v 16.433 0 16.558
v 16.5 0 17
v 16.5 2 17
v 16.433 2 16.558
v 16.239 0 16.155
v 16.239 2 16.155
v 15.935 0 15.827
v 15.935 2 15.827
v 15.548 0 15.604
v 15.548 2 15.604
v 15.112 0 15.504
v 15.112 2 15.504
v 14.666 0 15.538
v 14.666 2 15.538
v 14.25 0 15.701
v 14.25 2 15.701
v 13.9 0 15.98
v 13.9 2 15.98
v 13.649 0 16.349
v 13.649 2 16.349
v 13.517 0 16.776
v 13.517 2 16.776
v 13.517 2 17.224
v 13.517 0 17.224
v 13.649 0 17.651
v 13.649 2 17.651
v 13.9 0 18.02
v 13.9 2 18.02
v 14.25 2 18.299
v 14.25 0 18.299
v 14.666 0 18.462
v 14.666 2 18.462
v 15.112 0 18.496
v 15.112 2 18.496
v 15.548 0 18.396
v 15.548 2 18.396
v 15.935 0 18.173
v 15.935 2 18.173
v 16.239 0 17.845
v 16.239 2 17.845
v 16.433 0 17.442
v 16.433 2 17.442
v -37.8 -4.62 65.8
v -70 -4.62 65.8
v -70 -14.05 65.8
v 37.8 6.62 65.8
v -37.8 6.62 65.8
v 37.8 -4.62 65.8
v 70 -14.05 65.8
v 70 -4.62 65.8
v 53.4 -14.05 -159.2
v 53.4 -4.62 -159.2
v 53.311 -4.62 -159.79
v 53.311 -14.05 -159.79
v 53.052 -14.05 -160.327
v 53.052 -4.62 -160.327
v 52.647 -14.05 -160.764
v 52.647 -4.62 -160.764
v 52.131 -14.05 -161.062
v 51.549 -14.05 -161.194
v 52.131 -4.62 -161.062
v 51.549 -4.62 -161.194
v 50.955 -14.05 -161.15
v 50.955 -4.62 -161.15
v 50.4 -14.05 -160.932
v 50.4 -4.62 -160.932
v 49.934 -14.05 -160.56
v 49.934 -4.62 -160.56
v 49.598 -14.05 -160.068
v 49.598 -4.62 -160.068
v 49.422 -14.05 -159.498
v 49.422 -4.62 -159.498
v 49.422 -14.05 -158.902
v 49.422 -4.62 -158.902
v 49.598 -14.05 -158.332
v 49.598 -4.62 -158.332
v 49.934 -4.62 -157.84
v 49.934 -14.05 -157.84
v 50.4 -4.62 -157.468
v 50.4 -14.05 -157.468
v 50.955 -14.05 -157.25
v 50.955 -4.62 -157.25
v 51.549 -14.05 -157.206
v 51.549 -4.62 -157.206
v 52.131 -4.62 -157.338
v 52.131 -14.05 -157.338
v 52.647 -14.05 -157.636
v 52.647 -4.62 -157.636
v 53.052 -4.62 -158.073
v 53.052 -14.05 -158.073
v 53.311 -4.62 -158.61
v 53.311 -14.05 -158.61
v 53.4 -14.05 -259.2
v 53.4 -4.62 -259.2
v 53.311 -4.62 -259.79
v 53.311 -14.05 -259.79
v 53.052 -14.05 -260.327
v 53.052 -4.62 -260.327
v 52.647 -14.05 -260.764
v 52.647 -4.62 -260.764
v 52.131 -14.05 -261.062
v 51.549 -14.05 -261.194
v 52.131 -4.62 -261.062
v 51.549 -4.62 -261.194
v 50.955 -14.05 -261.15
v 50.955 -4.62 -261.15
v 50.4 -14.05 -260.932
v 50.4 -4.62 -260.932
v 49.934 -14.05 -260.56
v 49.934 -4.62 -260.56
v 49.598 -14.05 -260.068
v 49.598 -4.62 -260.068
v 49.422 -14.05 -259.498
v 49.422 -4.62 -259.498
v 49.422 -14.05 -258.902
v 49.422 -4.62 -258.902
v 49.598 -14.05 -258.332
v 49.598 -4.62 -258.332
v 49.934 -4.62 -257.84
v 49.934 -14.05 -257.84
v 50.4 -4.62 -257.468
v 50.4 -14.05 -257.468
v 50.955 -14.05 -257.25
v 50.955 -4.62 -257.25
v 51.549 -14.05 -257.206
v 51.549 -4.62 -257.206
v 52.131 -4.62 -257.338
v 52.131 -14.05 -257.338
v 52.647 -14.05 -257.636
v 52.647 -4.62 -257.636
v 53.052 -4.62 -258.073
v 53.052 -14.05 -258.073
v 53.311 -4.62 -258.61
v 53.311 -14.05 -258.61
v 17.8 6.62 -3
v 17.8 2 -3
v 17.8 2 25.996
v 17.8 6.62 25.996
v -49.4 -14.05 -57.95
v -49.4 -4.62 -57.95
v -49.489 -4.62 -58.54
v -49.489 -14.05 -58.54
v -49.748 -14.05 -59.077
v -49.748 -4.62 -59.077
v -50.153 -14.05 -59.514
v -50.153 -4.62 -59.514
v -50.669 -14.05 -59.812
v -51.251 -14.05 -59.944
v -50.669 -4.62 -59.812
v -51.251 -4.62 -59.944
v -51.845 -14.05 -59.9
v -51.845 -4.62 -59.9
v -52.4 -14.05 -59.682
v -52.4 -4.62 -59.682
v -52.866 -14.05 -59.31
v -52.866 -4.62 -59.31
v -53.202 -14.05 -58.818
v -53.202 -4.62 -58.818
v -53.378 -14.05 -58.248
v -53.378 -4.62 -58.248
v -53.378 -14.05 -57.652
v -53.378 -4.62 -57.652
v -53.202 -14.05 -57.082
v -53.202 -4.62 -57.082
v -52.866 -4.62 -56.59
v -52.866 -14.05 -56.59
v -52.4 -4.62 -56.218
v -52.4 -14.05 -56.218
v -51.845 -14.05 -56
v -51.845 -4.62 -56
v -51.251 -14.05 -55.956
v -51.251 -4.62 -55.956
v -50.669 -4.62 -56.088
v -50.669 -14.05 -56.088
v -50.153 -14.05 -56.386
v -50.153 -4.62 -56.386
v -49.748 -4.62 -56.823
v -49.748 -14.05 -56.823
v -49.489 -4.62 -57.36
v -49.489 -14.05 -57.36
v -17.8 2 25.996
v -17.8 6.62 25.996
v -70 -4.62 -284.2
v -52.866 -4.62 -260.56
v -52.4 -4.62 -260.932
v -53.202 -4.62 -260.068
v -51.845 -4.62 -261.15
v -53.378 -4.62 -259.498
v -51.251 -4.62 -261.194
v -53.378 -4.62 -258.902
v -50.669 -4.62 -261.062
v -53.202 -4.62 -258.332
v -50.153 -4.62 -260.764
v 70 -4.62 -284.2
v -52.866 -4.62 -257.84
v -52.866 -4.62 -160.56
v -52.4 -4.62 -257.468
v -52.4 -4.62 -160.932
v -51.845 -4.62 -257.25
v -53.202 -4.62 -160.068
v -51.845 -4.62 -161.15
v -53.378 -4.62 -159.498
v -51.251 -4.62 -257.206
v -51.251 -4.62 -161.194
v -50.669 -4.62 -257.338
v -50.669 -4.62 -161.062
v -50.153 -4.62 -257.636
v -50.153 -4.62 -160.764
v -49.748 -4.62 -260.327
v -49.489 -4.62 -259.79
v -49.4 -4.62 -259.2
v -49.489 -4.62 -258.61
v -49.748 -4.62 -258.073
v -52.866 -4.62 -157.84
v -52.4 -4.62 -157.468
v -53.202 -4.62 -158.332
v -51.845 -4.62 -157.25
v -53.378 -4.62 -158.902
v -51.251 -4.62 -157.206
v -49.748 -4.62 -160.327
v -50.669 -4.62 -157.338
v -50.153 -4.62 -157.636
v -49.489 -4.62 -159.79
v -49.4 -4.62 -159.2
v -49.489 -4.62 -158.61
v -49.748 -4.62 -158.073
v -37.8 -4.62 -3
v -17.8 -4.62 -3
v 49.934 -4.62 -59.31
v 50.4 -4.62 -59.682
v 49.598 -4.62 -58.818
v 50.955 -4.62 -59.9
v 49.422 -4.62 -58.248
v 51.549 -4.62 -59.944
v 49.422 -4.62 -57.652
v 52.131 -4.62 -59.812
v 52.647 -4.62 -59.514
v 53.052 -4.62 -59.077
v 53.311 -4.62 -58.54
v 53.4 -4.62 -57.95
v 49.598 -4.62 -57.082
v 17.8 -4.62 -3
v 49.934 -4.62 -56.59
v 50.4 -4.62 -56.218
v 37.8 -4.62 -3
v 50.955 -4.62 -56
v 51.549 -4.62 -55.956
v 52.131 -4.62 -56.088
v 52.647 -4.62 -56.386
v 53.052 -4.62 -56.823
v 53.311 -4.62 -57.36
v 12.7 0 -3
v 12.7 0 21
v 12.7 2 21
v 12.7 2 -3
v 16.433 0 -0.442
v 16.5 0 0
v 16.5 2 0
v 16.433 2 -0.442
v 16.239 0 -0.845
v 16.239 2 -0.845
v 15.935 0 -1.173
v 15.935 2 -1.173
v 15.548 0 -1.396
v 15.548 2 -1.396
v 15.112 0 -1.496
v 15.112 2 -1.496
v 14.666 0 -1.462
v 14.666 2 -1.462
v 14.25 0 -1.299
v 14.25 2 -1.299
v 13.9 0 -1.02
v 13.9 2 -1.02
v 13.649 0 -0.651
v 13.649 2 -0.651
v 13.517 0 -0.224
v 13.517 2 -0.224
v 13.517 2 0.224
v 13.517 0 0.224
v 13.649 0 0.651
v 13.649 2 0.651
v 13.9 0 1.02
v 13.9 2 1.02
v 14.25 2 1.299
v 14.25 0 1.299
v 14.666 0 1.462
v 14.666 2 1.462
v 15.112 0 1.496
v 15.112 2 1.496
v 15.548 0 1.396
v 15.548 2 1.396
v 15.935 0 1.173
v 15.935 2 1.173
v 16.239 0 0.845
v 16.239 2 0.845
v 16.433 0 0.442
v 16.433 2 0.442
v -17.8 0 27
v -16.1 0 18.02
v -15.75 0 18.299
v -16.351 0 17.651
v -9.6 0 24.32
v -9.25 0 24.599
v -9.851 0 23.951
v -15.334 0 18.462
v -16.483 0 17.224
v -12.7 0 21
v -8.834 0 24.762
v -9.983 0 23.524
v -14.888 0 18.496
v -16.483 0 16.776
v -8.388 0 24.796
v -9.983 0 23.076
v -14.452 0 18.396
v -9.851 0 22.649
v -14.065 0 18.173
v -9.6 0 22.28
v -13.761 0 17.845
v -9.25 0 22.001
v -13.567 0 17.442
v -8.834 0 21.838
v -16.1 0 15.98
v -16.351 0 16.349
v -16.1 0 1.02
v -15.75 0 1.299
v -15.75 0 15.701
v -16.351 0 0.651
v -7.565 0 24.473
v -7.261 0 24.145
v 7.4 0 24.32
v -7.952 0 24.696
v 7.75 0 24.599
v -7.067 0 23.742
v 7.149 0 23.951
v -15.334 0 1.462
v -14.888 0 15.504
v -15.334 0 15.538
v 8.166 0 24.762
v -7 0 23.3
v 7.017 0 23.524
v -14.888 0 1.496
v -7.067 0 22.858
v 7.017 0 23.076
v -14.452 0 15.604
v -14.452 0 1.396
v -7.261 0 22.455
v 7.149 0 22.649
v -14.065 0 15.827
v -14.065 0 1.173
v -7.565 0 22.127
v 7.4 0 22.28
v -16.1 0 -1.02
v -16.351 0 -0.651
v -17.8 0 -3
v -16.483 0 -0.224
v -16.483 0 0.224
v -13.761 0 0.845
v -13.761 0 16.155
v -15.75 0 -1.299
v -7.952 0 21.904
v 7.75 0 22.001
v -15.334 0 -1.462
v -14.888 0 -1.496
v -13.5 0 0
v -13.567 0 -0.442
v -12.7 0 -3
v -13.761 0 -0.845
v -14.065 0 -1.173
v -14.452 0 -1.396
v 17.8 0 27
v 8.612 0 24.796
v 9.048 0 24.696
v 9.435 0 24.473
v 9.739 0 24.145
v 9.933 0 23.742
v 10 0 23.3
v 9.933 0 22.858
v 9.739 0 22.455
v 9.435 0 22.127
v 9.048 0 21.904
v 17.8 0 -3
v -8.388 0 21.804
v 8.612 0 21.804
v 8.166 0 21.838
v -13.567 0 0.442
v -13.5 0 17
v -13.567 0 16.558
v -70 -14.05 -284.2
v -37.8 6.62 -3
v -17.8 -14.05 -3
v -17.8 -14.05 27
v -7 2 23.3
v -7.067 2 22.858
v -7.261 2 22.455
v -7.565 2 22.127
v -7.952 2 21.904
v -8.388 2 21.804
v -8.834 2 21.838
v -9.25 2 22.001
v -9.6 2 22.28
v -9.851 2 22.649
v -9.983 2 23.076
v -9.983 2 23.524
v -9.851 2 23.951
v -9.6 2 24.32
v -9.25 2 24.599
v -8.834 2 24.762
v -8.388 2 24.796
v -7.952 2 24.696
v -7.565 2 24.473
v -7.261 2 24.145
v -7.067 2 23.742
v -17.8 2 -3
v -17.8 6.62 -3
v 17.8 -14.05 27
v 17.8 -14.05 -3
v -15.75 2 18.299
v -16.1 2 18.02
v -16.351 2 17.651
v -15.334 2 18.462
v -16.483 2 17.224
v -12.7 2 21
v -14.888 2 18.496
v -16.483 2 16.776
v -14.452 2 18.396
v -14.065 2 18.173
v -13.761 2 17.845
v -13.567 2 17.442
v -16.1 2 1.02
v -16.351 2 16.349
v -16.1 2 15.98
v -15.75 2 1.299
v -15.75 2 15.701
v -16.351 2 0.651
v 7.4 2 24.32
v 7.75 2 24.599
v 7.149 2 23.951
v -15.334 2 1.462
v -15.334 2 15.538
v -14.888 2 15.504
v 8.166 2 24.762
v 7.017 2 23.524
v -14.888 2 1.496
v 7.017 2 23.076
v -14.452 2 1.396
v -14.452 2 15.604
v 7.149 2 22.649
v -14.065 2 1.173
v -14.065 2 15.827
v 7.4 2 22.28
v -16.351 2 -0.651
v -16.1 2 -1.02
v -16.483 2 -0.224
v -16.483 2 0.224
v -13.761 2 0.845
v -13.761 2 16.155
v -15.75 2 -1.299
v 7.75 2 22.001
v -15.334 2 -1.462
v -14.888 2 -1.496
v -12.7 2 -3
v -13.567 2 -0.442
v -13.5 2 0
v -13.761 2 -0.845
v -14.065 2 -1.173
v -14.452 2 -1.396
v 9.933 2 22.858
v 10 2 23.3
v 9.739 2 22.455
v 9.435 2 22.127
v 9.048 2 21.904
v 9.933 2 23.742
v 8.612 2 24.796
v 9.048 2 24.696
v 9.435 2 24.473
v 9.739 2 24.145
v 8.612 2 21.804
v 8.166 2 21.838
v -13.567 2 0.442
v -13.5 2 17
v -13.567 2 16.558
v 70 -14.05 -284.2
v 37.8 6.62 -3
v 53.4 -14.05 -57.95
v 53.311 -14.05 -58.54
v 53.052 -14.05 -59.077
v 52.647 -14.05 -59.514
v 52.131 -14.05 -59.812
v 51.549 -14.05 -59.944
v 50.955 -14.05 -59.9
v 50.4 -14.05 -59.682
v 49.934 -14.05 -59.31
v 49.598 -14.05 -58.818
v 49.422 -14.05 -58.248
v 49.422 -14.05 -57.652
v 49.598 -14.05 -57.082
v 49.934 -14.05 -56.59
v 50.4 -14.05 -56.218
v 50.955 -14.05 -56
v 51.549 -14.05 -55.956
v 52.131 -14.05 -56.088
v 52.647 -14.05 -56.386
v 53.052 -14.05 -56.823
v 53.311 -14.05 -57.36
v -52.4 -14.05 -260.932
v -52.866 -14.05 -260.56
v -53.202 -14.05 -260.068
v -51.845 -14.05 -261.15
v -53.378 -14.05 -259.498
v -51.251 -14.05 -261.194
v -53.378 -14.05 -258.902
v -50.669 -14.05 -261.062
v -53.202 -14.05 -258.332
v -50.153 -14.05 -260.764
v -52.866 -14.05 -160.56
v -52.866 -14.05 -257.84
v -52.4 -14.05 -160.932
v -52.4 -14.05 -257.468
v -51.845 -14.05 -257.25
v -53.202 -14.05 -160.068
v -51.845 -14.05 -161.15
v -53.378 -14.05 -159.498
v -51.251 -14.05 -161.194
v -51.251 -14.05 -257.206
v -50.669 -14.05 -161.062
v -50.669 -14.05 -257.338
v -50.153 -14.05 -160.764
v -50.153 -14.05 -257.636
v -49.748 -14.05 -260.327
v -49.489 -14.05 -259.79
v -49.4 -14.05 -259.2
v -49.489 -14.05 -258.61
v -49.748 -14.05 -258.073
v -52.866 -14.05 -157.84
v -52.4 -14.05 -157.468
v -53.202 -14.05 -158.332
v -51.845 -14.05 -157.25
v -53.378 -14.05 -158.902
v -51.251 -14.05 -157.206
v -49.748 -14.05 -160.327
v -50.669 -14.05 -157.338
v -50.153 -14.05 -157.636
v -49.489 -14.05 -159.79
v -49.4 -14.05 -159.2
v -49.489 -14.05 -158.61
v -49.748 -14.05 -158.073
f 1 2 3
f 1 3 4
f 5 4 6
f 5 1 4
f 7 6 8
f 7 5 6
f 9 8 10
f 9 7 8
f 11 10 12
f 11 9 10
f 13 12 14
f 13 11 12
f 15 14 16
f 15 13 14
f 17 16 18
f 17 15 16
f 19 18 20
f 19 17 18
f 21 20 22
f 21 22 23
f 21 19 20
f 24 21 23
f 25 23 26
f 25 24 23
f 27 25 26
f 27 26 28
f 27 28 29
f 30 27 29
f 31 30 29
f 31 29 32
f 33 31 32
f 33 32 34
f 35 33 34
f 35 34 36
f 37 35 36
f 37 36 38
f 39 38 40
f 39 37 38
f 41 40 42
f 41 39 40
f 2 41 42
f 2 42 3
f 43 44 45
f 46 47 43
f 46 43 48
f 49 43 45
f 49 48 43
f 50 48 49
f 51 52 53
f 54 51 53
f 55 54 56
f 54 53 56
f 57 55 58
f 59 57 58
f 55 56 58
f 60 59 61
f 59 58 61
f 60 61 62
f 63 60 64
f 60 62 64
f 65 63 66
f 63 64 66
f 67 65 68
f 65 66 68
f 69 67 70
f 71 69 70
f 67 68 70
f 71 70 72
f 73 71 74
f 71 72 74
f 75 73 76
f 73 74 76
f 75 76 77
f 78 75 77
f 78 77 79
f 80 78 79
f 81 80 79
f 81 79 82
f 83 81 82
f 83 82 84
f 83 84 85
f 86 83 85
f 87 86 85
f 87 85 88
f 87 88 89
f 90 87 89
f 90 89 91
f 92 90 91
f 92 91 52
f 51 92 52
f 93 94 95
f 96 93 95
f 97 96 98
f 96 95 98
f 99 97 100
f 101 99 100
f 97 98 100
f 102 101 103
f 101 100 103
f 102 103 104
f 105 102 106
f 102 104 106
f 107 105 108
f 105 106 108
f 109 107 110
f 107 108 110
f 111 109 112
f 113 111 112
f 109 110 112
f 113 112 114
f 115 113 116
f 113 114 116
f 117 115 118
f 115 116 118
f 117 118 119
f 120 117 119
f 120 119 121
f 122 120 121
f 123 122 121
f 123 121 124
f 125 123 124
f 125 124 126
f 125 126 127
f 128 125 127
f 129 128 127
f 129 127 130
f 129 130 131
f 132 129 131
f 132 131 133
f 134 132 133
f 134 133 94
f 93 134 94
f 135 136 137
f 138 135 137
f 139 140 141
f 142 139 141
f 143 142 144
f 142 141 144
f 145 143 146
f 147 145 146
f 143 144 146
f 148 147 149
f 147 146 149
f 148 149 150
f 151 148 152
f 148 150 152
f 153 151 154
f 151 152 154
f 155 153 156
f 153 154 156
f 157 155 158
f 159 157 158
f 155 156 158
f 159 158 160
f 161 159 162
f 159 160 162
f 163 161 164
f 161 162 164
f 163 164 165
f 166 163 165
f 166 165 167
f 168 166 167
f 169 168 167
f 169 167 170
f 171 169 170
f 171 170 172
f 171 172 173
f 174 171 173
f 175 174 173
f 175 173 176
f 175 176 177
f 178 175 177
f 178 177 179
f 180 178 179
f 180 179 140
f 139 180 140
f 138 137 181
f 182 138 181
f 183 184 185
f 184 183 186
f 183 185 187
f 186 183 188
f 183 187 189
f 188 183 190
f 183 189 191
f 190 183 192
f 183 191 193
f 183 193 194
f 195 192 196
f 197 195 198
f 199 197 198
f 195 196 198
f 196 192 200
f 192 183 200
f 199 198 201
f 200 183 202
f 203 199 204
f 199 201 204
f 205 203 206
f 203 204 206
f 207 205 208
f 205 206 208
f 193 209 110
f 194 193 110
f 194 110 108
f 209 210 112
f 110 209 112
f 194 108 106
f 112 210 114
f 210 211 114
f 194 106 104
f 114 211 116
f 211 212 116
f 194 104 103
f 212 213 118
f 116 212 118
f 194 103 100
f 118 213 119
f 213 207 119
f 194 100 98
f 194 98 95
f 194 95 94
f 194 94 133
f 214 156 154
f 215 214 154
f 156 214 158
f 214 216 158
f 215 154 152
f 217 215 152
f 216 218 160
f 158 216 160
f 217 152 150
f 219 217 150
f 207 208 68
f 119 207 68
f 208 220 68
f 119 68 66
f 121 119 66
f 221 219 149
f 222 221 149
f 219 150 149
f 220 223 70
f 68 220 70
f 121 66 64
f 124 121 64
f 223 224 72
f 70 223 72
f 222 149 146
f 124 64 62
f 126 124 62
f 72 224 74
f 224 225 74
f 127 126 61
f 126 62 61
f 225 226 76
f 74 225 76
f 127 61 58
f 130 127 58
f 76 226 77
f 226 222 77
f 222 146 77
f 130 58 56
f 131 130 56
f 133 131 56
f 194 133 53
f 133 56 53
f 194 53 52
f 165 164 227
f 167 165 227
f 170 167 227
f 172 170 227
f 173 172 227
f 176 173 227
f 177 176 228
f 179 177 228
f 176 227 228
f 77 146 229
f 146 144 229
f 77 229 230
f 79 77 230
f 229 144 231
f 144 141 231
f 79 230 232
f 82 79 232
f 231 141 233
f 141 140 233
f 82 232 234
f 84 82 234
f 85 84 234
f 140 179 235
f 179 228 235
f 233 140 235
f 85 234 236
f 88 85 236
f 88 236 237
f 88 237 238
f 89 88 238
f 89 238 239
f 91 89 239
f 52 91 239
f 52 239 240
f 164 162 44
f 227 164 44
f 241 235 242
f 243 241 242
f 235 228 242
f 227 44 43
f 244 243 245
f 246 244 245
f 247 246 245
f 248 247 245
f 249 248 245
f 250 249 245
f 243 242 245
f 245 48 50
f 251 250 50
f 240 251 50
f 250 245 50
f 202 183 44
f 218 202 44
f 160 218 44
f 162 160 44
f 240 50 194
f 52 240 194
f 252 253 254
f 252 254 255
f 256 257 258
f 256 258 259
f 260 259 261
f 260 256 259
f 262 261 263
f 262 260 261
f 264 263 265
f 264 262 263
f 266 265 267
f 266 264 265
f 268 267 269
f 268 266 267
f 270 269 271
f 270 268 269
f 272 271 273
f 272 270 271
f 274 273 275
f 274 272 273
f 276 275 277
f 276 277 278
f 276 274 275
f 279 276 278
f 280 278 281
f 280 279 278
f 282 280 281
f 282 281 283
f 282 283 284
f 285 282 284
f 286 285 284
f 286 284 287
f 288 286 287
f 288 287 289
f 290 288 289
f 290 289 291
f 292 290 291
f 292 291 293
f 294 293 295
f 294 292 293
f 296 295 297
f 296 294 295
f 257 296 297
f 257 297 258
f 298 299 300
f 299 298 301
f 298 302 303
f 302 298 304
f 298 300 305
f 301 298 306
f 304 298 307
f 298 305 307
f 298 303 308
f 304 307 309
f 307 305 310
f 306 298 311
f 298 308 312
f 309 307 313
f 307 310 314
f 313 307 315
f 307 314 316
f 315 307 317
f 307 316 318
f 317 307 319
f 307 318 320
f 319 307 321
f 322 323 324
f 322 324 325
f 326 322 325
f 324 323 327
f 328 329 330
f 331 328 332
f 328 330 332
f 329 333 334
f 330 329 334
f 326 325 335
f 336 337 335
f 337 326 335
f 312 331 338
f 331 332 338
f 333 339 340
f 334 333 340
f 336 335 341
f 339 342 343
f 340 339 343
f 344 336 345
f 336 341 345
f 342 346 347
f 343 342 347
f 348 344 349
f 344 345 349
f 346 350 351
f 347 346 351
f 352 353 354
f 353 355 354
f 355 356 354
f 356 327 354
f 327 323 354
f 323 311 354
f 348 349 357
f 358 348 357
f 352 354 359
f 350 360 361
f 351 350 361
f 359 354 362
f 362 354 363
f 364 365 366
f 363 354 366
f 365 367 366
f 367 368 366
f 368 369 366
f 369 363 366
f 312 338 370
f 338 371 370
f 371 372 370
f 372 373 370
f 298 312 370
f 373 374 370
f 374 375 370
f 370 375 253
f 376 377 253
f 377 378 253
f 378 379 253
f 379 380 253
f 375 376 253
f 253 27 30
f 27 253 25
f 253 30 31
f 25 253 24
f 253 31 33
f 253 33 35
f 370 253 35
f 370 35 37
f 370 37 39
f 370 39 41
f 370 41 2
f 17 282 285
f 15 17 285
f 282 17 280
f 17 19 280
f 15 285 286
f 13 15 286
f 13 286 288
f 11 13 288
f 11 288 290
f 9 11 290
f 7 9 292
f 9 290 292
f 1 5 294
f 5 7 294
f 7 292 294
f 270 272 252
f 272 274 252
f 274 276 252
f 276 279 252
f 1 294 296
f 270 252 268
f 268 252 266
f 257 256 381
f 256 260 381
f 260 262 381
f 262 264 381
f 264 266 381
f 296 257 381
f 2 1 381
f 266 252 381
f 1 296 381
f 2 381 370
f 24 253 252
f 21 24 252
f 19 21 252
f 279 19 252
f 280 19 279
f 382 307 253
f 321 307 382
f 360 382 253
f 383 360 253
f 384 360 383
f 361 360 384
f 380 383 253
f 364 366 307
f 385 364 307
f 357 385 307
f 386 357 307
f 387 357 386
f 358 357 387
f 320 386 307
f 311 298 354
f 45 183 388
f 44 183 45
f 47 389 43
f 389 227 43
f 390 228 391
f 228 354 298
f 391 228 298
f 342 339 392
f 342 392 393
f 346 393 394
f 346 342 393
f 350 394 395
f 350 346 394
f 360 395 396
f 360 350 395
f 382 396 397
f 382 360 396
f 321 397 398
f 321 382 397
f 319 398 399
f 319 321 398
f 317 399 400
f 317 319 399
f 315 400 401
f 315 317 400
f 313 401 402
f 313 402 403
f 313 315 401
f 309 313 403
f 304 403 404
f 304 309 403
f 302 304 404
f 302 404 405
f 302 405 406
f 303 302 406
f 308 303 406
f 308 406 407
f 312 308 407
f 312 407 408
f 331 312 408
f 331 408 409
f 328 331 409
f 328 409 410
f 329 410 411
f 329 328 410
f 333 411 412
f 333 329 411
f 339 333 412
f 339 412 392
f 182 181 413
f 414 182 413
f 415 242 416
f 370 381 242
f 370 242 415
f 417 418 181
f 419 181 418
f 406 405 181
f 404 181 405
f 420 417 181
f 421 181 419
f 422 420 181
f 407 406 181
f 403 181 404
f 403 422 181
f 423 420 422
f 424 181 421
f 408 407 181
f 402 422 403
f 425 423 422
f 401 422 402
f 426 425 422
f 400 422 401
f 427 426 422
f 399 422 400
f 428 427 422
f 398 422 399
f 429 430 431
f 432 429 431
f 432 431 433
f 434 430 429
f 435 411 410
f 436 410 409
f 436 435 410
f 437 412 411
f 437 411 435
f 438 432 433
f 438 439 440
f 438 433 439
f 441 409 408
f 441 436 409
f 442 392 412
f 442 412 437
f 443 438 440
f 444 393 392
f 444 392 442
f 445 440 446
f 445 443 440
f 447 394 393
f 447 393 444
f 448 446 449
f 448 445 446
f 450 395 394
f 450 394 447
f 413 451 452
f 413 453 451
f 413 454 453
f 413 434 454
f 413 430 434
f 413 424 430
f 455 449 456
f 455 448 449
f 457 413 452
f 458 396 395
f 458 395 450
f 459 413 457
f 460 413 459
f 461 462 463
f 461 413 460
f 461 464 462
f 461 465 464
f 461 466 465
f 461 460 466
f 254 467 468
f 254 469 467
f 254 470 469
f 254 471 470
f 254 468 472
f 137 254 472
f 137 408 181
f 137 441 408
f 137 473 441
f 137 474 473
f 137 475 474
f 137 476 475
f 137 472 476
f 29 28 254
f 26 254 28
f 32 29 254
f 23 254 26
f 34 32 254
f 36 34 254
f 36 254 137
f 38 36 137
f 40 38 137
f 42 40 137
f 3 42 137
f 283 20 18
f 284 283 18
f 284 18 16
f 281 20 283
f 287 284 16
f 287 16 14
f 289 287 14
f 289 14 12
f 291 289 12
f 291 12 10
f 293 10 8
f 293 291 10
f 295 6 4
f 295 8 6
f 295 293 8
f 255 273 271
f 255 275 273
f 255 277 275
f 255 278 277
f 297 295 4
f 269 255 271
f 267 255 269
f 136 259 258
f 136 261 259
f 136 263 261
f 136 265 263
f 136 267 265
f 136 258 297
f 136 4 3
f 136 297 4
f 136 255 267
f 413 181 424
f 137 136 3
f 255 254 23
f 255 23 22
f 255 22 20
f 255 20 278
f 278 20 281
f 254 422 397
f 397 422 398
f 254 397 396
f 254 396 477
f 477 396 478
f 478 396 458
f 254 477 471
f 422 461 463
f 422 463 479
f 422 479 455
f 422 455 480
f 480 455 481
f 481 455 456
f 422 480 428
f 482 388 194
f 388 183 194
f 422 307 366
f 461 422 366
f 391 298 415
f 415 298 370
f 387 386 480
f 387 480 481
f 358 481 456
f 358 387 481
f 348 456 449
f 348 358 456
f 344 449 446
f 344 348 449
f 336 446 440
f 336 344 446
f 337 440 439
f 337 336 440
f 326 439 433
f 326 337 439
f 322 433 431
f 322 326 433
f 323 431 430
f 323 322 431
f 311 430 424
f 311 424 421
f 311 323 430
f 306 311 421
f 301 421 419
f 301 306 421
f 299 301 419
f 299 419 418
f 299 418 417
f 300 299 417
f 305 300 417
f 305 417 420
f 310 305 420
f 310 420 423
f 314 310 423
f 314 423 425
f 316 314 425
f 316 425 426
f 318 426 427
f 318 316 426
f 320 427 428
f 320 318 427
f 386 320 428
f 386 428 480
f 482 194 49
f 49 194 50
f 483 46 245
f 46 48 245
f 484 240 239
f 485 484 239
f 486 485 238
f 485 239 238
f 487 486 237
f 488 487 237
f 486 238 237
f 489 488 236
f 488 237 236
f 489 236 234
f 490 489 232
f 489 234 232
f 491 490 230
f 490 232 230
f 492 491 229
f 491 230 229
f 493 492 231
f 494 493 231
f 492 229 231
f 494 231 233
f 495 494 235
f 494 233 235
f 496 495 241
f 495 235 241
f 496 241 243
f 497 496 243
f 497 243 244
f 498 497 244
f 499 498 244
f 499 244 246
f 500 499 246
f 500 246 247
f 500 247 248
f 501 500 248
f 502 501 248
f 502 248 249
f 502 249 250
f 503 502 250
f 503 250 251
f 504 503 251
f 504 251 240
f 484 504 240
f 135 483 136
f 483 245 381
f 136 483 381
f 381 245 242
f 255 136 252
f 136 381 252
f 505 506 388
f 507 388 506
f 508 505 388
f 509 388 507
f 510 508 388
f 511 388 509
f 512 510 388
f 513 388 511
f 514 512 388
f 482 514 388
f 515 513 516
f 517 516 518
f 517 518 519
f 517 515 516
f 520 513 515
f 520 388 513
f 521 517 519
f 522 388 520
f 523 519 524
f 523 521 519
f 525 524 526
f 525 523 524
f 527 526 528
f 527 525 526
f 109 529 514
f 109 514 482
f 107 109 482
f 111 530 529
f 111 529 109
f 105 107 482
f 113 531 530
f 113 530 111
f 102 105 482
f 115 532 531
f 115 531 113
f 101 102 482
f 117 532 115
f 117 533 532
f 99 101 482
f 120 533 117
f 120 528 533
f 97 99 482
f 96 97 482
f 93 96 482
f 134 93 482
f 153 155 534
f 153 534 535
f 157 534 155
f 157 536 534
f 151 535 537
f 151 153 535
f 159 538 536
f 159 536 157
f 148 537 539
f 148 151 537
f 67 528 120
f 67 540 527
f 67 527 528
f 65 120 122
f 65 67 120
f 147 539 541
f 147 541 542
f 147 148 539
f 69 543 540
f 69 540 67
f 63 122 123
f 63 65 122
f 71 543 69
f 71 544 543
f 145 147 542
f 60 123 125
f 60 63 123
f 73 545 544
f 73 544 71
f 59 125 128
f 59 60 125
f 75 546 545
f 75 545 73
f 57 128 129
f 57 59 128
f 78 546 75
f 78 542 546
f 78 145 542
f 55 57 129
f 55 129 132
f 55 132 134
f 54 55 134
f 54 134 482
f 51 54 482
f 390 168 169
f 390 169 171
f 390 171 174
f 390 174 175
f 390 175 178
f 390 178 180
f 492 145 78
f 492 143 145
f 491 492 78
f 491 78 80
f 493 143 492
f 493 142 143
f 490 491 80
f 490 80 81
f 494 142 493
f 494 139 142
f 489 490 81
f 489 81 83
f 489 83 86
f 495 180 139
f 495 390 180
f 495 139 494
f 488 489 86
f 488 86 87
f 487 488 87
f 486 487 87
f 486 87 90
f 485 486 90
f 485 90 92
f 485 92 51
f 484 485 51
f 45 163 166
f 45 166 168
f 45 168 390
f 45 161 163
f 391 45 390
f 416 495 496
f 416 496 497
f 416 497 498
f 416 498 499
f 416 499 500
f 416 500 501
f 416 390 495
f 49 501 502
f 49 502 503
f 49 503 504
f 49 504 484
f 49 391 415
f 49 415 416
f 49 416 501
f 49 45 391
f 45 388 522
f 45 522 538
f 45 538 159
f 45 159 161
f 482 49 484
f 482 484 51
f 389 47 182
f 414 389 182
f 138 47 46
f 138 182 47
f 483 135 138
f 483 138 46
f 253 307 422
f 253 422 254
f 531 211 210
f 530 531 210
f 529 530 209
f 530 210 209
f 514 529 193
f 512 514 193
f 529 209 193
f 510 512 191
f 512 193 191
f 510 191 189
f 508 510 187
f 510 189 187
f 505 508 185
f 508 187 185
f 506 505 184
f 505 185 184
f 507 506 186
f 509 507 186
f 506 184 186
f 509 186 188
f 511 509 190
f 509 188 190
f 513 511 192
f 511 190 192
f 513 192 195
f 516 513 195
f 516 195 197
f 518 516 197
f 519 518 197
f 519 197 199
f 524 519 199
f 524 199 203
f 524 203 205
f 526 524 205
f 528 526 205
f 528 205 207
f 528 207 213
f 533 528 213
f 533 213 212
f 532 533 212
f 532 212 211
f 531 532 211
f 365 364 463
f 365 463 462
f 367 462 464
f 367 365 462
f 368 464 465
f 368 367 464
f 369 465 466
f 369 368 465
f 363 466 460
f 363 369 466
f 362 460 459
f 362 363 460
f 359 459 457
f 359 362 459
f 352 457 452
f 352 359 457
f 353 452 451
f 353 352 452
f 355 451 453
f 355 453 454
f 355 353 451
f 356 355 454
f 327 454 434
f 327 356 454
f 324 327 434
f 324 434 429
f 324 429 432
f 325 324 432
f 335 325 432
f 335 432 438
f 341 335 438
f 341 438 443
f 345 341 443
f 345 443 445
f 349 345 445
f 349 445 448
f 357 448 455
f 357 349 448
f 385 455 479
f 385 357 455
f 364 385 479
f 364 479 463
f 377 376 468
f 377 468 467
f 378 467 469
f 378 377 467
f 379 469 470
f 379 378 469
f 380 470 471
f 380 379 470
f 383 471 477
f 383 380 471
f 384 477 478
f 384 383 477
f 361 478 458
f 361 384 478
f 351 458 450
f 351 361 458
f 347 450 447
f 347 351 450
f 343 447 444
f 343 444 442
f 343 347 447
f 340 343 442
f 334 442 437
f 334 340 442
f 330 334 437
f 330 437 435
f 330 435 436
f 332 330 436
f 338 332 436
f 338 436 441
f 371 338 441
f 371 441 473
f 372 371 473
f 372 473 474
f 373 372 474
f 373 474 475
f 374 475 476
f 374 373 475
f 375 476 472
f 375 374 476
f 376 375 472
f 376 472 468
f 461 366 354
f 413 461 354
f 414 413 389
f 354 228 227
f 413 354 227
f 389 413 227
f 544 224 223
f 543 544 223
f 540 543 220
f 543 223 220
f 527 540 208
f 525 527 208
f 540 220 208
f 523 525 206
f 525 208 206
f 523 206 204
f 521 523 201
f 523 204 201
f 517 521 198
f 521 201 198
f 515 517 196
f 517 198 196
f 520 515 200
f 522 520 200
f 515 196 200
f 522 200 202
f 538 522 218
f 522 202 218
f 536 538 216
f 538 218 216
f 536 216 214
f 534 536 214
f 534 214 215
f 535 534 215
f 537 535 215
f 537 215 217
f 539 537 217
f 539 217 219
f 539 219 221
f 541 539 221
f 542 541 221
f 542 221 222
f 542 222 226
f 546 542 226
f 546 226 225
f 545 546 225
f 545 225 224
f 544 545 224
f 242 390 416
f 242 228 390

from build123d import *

# Parameters (mm, degrees)
SKETCH2_R            = 1.5
SKETCH2_W            = 25.4
SKETCH2_H            = 46
BOSS_EXTRUDE1_DEPTH  = 2
BOSS_EXTRUDE3_DEPTH  = 4.62
SKETCH5_5_R          = 1.5
CUT_EXTRUDE3_DEPTH   = 10
BOSS_EXTRUDE4_DEPTH  = 4.62
SKETCH8_W            = 140
SKETCH8_H            = 350
SKETCH8_W_2          = 35.6
SKETCH8_H_2          = 30
BOSS_EXTRUDE10_DEPTH = 4.63
SKETCH9_W            = 140
SKETCH9_H            = 350
SKETCH9_W_2          = 35.6
SKETCH9_H_2          = 30
BOSS_EXTRUDE11_DEPTH = 4.8
SKETCH10_R           = 2
CUT_EXTRUDE4_DEPTH   = 10.43


with BuildPart() as part:
    # Sketch2 → Boss-Extrude1 (new body)
    with BuildSketch(Plane(origin=(0, 0, 0), x_dir=(1, 0, 0), z_dir=(0, 1, 0))):
        Polygon((37.8, -65.8), (37.8, 64.2), (9.15, 64.2), (-37.8, 64.2), (-37.8, -65.8), align=None)
        with Locations((-8.5, -23.3)):
            Circle(SKETCH2_R, mode=Mode.SUBTRACT)
        with Locations((-15, -17)):
            Circle(SKETCH2_R, mode=Mode.SUBTRACT)
        with Locations((-15, 0)):
            Circle(SKETCH2_R, mode=Mode.SUBTRACT)
        with Locations((8.5, -23.3)):
            Circle(SKETCH2_R, mode=Mode.SUBTRACT)
        with Locations((15, -17)):
            Circle(SKETCH2_R, mode=Mode.SUBTRACT)
        with Locations((15, 0)):
            Circle(SKETCH2_R, mode=Mode.SUBTRACT)
        with Locations((-15, 17)):
            Circle(SKETCH2_R, mode=Mode.SUBTRACT)
        with Locations((0, 2)):
            Rectangle(SKETCH2_W, SKETCH2_H, mode=Mode.SUBTRACT)
        with Locations((15, 17)):
            Circle(SKETCH2_R, mode=Mode.SUBTRACT)
    extrude(amount=BOSS_EXTRUDE1_DEPTH)

    # Sketch5 → Boss-Extrude3 (add)
    with BuildSketch(Plane.XZ):
        Polygon((37.8, 30.8), (37.8, 65.8), (-37.8, 65.8), (-37.8, 30.8), (-37.8, -3), (-17.8, -3), (-17.8, 27), (17.8, 27), (17.8, -3), (37.8, -3), align=None)
    extrude(amount=BOSS_EXTRUDE3_DEPTH)

    # Sketch5<5> → Cut-Extrude3 (cut)
    with BuildSketch(Plane.XZ):
        Polygon((37.8, -3), (12.7, -3), (12.7, -25), (-12.7, -25), (-12.7, -3), (-37.8, -3), (-37.8, -64.2), (37.8, -64.2), align=None)
        with Locations((15, -17)):
            Circle(SKETCH5_5_R, mode=Mode.SUBTRACT)
        with Locations((-15, -17)):
            Circle(SKETCH5_5_R, mode=Mode.SUBTRACT)
    extrude(amount=-CUT_EXTRUDE3_DEPTH, mode=Mode.SUBTRACT)

    # Sketch6 → Boss-Extrude4 (add)
    with BuildSketch(Plane(origin=(0, 2, 0), x_dir=(1, 0, 0), z_dir=(0, 1, 0))):
        Polygon((-17.8, -25.996410493), (-17.8, 3), (-37.8, 3), (-37.8, -65.8), (0, -65.8), (37.8, -65.8), (37.8, 3), (17.8, 3), (17.8, -25.996410493), align=None)
    extrude(amount=BOSS_EXTRUDE4_DEPTH)

    # Sketch8 → Boss-Extrude10 (add)
    with BuildSketch(Plane.XZ.offset(4.62)):
        with Locations((0, -109.2)):
            Rectangle(SKETCH8_W, SKETCH8_H)
        with Locations((0, 12)):
            Rectangle(SKETCH8_W_2, SKETCH8_H_2, mode=Mode.SUBTRACT)
    extrude(amount=BOSS_EXTRUDE10_DEPTH)

    # Sketch9 → Boss-Extrude11 (add)
    with BuildSketch(Plane.XZ.offset(9.25)):
        with Locations((0, -109.2)):
            Rectangle(SKETCH9_W, SKETCH9_H)
        with Locations((0, 12)):
            Rectangle(SKETCH9_W_2, SKETCH9_H_2, mode=Mode.SUBTRACT)
    extrude(amount=BOSS_EXTRUDE11_DEPTH)

    # Sketch10 → Cut-Extrude4 (cut, through all)
    with BuildSketch(Plane(origin=(0, -4.62, 0), x_dir=(1, 0, 0), z_dir=(0, 1, 0))):
        with Locations((51.4, 57.95)):
            Circle(SKETCH10_R)
        with Locations((51.4, 159.2)):
            Circle(SKETCH10_R)
        with Locations((51.4, 259.2)):
            Circle(SKETCH10_R)
        with Locations((-51.4, 259.2)):
            Circle(SKETCH10_R)
        with Locations((-51.4, 57.95)):
            Circle(SKETCH10_R)
        with Locations((-51.4, 159.2)):
            Circle(SKETCH10_R)
    extrude(amount=-CUT_EXTRUDE4_DEPTH, mode=Mode.SUBTRACT)


solid = part.part
